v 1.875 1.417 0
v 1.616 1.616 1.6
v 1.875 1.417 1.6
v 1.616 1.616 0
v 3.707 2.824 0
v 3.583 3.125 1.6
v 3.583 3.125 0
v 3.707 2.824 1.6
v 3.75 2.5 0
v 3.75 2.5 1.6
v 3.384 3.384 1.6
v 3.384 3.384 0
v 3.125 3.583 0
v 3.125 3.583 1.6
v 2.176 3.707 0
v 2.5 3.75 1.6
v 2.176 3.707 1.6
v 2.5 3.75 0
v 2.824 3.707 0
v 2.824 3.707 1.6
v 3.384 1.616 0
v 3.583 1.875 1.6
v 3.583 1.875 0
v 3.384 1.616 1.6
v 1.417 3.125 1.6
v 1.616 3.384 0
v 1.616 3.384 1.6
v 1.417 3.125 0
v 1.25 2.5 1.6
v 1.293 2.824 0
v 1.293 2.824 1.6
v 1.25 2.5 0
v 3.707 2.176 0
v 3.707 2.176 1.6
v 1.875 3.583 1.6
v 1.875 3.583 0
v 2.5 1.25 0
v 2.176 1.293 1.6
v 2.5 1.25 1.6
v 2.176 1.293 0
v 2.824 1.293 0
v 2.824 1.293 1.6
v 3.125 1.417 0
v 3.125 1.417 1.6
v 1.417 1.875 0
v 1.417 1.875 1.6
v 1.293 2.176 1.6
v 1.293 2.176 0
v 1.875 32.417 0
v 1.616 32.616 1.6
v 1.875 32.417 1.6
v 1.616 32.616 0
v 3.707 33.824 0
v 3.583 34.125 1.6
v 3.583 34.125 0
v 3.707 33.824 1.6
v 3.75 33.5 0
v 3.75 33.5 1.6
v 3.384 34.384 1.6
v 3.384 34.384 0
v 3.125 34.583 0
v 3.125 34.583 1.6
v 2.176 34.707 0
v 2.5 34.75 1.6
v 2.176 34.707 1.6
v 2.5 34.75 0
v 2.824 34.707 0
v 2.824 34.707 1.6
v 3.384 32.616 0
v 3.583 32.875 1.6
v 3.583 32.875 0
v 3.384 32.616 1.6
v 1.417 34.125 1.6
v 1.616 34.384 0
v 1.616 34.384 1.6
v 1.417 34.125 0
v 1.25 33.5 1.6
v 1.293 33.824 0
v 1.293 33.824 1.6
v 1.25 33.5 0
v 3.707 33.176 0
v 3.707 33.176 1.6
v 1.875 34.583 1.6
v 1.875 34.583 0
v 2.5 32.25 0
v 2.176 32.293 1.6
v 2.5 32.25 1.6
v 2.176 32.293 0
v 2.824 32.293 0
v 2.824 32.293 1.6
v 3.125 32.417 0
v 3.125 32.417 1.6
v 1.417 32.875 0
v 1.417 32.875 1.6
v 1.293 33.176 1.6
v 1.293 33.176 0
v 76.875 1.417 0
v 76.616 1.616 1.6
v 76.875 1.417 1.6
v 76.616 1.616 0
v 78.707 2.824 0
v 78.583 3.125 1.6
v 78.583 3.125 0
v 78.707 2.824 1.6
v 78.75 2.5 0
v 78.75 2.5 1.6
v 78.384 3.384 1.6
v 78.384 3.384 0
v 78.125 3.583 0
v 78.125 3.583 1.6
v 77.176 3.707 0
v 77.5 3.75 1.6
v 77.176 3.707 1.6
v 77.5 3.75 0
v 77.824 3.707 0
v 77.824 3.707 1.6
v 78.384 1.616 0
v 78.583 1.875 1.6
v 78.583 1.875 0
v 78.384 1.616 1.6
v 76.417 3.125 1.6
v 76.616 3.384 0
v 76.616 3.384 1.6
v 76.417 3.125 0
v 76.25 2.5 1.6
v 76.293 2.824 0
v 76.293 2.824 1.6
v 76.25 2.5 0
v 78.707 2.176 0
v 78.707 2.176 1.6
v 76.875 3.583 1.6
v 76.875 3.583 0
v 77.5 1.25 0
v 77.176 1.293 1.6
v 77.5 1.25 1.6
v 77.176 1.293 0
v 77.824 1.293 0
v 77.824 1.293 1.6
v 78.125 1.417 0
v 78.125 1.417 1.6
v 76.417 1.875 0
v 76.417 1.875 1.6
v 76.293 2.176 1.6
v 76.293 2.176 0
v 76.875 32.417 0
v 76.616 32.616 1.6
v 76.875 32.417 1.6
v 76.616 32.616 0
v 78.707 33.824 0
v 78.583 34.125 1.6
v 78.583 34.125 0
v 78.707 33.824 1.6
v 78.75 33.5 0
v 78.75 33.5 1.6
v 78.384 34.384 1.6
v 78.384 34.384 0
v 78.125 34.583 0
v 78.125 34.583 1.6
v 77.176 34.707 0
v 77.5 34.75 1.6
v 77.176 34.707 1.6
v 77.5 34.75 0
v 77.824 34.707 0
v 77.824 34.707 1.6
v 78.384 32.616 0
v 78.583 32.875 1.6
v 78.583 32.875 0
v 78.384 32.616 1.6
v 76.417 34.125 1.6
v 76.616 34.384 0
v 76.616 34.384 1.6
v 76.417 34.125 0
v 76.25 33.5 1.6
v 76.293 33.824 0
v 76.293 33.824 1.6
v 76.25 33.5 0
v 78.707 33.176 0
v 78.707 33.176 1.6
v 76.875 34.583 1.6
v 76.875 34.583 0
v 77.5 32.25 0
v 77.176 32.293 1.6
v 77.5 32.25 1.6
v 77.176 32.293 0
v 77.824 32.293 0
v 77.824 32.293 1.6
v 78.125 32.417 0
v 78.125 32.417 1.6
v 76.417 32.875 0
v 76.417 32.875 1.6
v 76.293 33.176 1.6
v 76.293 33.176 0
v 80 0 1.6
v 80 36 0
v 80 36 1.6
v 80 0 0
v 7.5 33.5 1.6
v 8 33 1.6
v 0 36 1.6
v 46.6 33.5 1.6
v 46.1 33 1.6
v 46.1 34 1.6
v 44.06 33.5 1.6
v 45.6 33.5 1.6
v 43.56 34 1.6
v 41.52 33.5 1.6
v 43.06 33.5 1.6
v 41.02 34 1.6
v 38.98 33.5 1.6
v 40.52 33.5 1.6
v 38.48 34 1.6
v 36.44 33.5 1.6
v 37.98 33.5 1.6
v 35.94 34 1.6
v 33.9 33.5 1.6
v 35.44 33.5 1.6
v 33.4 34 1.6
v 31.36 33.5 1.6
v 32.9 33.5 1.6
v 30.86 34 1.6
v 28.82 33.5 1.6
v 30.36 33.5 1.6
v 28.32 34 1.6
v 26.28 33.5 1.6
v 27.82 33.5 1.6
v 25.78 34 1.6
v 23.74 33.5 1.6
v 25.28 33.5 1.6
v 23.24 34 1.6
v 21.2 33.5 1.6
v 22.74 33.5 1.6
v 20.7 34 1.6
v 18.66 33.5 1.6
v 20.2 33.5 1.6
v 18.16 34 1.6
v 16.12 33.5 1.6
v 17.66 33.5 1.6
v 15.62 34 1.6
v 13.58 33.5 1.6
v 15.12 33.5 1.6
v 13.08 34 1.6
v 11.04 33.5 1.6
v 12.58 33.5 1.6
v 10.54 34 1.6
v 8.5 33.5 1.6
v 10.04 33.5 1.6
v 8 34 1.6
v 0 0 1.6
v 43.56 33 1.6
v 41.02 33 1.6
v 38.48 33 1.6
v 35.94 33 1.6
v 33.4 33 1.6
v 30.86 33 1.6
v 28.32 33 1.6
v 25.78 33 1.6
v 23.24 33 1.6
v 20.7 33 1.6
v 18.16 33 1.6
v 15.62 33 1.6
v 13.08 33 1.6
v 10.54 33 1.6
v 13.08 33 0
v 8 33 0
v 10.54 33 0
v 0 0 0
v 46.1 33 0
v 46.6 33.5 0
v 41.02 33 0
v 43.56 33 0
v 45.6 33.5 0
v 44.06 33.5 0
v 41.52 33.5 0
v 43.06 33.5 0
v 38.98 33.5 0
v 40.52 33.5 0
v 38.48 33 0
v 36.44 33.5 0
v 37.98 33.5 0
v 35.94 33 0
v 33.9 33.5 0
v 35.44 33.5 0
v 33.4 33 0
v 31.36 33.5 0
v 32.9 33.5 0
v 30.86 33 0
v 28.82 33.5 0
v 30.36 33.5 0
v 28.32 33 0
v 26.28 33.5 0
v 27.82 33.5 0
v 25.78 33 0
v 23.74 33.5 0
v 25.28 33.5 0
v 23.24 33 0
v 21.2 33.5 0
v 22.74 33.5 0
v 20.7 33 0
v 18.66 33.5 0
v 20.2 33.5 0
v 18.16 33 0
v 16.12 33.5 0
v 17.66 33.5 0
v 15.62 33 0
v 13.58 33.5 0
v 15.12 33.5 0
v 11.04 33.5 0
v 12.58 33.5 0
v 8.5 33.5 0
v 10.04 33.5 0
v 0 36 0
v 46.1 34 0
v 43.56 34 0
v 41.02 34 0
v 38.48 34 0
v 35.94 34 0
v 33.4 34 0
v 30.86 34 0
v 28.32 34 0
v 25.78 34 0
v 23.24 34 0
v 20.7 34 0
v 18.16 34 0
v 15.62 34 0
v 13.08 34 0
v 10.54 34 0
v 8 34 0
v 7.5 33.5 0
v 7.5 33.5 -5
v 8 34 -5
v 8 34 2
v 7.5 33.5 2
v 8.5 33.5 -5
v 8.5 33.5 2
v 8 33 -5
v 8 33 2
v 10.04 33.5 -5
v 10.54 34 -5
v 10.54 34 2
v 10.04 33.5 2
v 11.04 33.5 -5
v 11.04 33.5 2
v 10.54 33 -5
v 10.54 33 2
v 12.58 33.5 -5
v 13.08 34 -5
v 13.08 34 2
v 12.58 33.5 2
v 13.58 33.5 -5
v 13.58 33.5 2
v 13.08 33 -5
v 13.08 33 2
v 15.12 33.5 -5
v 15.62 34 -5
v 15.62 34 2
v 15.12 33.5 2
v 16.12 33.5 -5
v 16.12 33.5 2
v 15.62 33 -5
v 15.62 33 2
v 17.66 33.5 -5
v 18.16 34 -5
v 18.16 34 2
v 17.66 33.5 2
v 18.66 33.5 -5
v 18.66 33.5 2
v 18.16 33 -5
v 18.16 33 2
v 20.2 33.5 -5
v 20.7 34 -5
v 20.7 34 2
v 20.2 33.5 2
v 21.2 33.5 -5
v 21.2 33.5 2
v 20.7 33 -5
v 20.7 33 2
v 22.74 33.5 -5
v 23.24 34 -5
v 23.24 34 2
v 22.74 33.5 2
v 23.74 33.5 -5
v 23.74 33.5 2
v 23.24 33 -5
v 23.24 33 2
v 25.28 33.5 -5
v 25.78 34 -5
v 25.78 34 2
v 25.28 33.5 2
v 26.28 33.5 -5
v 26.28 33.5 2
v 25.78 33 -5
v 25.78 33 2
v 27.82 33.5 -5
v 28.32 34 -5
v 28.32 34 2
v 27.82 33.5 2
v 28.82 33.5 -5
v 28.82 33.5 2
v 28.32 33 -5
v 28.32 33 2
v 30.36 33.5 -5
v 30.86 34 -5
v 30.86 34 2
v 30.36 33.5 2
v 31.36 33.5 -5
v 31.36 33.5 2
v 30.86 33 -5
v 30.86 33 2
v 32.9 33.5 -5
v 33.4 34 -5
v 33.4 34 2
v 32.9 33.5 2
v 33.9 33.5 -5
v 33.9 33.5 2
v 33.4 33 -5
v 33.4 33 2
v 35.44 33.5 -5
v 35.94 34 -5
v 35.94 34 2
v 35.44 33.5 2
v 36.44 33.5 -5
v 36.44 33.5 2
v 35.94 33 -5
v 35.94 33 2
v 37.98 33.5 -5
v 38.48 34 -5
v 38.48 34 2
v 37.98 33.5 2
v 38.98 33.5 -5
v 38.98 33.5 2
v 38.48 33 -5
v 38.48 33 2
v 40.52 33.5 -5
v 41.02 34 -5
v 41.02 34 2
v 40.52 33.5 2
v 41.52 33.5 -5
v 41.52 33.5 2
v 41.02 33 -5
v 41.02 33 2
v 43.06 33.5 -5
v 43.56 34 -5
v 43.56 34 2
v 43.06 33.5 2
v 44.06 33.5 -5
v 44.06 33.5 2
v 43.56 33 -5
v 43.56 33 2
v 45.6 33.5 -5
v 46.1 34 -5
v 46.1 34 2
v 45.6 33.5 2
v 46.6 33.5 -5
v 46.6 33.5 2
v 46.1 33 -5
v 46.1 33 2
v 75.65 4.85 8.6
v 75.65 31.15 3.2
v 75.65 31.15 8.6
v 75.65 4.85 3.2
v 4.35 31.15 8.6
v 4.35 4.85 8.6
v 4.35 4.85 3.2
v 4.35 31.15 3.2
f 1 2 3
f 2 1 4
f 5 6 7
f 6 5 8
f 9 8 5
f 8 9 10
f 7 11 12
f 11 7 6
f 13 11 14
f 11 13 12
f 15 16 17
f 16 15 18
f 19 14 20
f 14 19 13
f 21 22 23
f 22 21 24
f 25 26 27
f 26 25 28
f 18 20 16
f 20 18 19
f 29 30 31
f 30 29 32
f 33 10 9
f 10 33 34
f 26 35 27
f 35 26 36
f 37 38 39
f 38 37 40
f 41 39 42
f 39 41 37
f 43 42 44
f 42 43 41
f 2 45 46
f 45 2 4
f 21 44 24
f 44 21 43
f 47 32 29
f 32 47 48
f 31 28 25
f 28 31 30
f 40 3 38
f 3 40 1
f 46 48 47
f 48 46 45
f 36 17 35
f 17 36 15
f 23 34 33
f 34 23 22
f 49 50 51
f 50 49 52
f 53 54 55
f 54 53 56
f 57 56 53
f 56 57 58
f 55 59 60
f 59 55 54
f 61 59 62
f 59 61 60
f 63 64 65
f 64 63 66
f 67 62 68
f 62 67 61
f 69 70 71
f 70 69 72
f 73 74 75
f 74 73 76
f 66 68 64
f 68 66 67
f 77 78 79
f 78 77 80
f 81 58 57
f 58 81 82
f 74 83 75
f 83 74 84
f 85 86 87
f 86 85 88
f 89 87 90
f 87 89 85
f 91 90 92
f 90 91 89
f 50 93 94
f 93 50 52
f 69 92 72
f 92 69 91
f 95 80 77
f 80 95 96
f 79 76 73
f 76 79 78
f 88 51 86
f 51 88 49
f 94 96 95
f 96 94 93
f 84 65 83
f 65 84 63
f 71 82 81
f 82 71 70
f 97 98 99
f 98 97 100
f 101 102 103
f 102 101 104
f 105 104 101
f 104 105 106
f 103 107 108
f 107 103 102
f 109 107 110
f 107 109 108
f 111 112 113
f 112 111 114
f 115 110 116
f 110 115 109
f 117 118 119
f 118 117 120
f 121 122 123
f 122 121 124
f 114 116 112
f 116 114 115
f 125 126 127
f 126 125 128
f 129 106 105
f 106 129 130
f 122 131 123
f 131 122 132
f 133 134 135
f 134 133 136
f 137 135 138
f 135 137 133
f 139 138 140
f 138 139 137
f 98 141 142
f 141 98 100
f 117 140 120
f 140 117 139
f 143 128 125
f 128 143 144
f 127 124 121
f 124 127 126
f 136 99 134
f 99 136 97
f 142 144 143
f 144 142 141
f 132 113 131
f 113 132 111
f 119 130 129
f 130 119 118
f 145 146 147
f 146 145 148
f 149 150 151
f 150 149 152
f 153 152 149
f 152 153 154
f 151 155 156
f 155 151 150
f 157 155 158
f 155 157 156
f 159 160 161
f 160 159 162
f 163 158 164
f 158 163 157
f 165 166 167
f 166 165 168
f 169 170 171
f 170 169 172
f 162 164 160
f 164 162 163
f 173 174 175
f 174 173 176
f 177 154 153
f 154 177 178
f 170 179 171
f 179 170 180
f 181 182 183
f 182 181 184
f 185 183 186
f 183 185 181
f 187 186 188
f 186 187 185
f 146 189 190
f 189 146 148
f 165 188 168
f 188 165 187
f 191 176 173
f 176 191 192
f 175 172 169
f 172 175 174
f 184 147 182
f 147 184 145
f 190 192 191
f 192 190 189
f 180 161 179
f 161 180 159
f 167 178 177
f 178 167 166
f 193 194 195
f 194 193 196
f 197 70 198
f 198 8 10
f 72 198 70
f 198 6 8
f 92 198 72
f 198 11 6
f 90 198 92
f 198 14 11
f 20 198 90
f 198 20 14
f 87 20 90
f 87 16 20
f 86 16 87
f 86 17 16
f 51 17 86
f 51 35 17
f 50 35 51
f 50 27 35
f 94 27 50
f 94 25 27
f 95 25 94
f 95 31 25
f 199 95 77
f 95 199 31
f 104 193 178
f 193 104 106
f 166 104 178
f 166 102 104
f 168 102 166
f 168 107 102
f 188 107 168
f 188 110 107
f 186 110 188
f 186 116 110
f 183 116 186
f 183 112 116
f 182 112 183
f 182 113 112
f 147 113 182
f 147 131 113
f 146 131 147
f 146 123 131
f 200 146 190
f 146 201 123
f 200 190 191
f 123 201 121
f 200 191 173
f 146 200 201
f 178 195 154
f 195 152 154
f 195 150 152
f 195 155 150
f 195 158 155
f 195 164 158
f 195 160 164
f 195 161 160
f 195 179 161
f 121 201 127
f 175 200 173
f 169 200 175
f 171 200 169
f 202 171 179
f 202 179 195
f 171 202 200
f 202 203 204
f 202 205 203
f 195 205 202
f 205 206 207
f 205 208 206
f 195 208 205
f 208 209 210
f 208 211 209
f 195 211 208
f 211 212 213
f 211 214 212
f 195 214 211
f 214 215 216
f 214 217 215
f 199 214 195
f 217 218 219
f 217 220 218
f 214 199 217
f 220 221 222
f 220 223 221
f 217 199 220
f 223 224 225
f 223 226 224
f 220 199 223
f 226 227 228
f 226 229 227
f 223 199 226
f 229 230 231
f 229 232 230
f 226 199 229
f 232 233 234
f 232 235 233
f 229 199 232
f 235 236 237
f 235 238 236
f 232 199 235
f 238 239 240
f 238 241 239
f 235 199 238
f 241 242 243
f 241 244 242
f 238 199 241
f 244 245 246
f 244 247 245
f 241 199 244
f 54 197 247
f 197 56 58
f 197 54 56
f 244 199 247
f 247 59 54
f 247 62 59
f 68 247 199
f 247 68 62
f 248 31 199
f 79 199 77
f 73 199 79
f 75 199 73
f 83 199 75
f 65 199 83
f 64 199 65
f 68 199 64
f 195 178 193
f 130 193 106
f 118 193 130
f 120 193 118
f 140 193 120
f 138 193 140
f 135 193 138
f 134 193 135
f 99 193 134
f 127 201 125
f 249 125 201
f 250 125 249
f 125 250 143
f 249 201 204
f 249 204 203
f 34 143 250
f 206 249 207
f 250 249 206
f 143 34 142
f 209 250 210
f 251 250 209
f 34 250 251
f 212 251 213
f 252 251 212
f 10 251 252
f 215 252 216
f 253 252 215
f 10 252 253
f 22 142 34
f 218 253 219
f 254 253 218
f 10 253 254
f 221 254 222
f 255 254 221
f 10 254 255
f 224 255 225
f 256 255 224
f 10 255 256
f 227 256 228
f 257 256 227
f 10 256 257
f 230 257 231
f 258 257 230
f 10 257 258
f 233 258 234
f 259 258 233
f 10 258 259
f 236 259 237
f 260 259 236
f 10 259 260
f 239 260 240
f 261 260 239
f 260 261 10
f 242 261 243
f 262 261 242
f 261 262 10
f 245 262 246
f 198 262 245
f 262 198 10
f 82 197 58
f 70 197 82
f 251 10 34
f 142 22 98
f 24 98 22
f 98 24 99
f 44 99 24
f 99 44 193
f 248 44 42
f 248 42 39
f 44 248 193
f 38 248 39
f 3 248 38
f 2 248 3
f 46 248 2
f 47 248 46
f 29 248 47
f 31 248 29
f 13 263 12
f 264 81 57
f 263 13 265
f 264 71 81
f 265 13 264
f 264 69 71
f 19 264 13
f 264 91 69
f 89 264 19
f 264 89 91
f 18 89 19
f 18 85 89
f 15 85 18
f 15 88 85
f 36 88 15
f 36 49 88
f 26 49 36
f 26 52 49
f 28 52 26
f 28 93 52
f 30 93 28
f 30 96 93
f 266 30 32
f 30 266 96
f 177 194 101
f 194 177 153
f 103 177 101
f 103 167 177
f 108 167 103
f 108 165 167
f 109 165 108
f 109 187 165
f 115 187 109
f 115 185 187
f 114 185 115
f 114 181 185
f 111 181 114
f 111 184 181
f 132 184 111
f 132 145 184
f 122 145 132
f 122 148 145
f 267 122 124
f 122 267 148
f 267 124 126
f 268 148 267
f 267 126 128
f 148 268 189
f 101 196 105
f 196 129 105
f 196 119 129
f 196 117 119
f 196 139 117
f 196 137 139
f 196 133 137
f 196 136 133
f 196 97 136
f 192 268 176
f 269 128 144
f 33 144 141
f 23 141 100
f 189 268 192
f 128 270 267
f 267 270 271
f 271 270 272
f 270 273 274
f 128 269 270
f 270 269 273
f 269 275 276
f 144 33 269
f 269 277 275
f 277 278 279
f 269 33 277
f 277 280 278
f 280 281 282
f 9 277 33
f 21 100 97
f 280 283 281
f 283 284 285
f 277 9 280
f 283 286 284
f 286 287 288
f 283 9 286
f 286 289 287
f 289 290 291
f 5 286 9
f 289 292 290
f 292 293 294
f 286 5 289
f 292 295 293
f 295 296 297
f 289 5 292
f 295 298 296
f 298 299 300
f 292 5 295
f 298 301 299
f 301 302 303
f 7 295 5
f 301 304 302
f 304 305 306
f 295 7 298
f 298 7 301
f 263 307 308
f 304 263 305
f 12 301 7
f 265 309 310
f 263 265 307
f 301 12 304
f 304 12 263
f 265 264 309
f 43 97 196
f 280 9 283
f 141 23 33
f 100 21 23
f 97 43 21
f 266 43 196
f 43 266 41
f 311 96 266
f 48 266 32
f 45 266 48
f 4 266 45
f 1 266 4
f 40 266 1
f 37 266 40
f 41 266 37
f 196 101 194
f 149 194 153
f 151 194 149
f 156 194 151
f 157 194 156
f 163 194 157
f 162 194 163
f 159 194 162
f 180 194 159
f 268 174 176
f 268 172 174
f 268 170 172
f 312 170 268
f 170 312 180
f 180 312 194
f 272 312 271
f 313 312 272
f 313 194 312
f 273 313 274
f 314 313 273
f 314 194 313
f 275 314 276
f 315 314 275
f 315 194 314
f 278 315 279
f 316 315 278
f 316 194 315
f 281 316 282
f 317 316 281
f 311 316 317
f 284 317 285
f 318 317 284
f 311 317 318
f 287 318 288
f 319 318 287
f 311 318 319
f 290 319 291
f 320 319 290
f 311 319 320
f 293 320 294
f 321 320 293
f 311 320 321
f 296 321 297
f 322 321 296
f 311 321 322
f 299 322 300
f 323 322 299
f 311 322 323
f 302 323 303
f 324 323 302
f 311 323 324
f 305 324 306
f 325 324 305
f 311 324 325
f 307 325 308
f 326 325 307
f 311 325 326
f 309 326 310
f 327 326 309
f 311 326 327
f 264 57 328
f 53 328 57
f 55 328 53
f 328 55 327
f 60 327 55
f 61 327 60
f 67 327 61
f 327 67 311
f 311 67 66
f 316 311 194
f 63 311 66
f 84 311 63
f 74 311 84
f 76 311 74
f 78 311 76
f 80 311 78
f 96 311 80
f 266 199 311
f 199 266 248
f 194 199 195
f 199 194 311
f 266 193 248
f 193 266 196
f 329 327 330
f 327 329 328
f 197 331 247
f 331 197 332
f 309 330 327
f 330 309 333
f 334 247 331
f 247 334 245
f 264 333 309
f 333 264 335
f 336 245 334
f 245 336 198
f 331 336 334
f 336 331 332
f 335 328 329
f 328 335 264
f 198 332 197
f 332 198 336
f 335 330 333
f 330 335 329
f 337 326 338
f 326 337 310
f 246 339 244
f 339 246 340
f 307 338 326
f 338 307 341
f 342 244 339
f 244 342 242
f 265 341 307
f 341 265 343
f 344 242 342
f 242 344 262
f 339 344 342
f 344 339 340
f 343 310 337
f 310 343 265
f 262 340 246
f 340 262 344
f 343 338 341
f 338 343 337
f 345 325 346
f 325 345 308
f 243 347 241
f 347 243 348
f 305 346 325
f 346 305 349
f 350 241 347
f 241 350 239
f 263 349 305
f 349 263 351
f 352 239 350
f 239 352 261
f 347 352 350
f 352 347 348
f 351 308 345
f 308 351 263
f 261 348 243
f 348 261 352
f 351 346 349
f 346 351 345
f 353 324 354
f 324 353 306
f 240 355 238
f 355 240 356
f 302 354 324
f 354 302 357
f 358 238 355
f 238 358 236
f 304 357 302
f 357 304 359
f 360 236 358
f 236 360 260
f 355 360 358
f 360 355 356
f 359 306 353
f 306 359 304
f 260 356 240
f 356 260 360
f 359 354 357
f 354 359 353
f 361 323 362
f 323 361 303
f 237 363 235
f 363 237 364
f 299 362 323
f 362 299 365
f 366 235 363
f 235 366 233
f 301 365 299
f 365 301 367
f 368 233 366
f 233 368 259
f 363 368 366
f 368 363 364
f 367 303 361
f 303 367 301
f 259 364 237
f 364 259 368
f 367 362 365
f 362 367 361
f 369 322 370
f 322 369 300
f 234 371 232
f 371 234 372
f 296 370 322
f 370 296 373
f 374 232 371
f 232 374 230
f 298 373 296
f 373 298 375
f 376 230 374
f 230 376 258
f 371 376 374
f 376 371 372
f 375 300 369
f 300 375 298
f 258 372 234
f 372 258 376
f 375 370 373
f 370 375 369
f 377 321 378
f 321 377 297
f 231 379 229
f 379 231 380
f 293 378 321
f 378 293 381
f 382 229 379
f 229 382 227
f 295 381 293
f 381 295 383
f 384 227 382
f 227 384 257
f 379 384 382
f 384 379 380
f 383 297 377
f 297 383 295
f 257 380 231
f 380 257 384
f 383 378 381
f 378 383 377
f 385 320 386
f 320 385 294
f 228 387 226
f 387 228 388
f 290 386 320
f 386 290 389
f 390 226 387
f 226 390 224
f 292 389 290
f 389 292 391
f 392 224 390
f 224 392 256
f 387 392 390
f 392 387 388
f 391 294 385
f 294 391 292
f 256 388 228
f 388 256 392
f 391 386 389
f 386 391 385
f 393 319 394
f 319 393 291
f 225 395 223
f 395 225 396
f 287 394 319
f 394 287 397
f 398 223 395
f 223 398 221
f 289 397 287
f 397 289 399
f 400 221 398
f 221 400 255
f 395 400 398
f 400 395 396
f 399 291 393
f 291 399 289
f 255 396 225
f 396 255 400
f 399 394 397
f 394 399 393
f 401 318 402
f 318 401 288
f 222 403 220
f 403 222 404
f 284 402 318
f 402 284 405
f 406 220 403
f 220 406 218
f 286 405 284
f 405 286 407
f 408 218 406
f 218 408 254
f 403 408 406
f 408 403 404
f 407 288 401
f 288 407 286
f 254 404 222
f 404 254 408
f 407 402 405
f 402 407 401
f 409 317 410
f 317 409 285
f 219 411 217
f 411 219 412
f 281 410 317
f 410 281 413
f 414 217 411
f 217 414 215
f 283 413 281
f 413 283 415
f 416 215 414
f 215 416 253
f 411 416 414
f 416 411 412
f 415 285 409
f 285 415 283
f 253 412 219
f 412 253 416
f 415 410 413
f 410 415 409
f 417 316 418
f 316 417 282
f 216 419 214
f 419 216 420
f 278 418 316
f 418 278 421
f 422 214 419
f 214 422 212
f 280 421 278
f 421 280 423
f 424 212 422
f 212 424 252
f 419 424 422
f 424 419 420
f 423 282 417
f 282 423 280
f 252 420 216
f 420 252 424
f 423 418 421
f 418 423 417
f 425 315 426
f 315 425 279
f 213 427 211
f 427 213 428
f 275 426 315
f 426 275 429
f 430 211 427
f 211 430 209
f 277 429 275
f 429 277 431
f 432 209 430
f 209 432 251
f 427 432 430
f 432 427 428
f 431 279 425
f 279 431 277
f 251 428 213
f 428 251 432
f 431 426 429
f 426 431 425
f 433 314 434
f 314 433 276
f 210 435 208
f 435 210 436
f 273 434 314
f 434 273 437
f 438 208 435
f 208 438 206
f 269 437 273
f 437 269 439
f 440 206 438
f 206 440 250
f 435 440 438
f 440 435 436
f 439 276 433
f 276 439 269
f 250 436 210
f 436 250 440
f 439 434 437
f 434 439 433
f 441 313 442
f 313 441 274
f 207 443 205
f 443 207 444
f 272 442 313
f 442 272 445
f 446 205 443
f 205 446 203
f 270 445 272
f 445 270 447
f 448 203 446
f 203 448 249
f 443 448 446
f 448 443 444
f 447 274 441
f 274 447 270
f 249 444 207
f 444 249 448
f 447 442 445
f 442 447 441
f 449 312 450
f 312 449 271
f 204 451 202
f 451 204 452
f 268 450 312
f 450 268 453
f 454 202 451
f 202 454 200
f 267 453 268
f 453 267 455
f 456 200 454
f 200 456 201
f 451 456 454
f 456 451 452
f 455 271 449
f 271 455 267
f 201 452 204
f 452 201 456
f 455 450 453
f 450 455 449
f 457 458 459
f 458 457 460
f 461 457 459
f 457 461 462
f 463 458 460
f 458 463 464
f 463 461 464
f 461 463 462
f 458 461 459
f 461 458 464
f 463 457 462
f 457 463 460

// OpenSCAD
module lcd() {

  // PCB with mounting holes
  difference() {
    color("#006020")  cube([80,36,1.6]);
    translate( [0, 0, -0.1]) {
      $fn = 24;
      translate( [2.5, 2.5, 0])  cylinder( d=2.5, h=1.8);
      translate( [2.5, 36-2.5, 0])  cylinder( d=2.5, h=1.8);
      translate( [80-2.5, 2.5, 0])  cylinder( d=2.5, h=1.8);
      translate( [80-2.5, 36-2.5, 0])  cylinder( d=2.5, h=1.8);
    }
  }
  // display body
  translate([4.35, 4.85, 3.2]) color("grey") cube([71.3, 26.3, 5.4]);
  // connector pins
  color("#FFFF00")
  translate( [8, 36-2.5, -5]) {
    $fn = 4;
    for( i=[0:15]) {
      translate( [i*2.54, 0, 0])
	cylinder( d=1.0,h=7);
    }
  }
}

lcd();


    
